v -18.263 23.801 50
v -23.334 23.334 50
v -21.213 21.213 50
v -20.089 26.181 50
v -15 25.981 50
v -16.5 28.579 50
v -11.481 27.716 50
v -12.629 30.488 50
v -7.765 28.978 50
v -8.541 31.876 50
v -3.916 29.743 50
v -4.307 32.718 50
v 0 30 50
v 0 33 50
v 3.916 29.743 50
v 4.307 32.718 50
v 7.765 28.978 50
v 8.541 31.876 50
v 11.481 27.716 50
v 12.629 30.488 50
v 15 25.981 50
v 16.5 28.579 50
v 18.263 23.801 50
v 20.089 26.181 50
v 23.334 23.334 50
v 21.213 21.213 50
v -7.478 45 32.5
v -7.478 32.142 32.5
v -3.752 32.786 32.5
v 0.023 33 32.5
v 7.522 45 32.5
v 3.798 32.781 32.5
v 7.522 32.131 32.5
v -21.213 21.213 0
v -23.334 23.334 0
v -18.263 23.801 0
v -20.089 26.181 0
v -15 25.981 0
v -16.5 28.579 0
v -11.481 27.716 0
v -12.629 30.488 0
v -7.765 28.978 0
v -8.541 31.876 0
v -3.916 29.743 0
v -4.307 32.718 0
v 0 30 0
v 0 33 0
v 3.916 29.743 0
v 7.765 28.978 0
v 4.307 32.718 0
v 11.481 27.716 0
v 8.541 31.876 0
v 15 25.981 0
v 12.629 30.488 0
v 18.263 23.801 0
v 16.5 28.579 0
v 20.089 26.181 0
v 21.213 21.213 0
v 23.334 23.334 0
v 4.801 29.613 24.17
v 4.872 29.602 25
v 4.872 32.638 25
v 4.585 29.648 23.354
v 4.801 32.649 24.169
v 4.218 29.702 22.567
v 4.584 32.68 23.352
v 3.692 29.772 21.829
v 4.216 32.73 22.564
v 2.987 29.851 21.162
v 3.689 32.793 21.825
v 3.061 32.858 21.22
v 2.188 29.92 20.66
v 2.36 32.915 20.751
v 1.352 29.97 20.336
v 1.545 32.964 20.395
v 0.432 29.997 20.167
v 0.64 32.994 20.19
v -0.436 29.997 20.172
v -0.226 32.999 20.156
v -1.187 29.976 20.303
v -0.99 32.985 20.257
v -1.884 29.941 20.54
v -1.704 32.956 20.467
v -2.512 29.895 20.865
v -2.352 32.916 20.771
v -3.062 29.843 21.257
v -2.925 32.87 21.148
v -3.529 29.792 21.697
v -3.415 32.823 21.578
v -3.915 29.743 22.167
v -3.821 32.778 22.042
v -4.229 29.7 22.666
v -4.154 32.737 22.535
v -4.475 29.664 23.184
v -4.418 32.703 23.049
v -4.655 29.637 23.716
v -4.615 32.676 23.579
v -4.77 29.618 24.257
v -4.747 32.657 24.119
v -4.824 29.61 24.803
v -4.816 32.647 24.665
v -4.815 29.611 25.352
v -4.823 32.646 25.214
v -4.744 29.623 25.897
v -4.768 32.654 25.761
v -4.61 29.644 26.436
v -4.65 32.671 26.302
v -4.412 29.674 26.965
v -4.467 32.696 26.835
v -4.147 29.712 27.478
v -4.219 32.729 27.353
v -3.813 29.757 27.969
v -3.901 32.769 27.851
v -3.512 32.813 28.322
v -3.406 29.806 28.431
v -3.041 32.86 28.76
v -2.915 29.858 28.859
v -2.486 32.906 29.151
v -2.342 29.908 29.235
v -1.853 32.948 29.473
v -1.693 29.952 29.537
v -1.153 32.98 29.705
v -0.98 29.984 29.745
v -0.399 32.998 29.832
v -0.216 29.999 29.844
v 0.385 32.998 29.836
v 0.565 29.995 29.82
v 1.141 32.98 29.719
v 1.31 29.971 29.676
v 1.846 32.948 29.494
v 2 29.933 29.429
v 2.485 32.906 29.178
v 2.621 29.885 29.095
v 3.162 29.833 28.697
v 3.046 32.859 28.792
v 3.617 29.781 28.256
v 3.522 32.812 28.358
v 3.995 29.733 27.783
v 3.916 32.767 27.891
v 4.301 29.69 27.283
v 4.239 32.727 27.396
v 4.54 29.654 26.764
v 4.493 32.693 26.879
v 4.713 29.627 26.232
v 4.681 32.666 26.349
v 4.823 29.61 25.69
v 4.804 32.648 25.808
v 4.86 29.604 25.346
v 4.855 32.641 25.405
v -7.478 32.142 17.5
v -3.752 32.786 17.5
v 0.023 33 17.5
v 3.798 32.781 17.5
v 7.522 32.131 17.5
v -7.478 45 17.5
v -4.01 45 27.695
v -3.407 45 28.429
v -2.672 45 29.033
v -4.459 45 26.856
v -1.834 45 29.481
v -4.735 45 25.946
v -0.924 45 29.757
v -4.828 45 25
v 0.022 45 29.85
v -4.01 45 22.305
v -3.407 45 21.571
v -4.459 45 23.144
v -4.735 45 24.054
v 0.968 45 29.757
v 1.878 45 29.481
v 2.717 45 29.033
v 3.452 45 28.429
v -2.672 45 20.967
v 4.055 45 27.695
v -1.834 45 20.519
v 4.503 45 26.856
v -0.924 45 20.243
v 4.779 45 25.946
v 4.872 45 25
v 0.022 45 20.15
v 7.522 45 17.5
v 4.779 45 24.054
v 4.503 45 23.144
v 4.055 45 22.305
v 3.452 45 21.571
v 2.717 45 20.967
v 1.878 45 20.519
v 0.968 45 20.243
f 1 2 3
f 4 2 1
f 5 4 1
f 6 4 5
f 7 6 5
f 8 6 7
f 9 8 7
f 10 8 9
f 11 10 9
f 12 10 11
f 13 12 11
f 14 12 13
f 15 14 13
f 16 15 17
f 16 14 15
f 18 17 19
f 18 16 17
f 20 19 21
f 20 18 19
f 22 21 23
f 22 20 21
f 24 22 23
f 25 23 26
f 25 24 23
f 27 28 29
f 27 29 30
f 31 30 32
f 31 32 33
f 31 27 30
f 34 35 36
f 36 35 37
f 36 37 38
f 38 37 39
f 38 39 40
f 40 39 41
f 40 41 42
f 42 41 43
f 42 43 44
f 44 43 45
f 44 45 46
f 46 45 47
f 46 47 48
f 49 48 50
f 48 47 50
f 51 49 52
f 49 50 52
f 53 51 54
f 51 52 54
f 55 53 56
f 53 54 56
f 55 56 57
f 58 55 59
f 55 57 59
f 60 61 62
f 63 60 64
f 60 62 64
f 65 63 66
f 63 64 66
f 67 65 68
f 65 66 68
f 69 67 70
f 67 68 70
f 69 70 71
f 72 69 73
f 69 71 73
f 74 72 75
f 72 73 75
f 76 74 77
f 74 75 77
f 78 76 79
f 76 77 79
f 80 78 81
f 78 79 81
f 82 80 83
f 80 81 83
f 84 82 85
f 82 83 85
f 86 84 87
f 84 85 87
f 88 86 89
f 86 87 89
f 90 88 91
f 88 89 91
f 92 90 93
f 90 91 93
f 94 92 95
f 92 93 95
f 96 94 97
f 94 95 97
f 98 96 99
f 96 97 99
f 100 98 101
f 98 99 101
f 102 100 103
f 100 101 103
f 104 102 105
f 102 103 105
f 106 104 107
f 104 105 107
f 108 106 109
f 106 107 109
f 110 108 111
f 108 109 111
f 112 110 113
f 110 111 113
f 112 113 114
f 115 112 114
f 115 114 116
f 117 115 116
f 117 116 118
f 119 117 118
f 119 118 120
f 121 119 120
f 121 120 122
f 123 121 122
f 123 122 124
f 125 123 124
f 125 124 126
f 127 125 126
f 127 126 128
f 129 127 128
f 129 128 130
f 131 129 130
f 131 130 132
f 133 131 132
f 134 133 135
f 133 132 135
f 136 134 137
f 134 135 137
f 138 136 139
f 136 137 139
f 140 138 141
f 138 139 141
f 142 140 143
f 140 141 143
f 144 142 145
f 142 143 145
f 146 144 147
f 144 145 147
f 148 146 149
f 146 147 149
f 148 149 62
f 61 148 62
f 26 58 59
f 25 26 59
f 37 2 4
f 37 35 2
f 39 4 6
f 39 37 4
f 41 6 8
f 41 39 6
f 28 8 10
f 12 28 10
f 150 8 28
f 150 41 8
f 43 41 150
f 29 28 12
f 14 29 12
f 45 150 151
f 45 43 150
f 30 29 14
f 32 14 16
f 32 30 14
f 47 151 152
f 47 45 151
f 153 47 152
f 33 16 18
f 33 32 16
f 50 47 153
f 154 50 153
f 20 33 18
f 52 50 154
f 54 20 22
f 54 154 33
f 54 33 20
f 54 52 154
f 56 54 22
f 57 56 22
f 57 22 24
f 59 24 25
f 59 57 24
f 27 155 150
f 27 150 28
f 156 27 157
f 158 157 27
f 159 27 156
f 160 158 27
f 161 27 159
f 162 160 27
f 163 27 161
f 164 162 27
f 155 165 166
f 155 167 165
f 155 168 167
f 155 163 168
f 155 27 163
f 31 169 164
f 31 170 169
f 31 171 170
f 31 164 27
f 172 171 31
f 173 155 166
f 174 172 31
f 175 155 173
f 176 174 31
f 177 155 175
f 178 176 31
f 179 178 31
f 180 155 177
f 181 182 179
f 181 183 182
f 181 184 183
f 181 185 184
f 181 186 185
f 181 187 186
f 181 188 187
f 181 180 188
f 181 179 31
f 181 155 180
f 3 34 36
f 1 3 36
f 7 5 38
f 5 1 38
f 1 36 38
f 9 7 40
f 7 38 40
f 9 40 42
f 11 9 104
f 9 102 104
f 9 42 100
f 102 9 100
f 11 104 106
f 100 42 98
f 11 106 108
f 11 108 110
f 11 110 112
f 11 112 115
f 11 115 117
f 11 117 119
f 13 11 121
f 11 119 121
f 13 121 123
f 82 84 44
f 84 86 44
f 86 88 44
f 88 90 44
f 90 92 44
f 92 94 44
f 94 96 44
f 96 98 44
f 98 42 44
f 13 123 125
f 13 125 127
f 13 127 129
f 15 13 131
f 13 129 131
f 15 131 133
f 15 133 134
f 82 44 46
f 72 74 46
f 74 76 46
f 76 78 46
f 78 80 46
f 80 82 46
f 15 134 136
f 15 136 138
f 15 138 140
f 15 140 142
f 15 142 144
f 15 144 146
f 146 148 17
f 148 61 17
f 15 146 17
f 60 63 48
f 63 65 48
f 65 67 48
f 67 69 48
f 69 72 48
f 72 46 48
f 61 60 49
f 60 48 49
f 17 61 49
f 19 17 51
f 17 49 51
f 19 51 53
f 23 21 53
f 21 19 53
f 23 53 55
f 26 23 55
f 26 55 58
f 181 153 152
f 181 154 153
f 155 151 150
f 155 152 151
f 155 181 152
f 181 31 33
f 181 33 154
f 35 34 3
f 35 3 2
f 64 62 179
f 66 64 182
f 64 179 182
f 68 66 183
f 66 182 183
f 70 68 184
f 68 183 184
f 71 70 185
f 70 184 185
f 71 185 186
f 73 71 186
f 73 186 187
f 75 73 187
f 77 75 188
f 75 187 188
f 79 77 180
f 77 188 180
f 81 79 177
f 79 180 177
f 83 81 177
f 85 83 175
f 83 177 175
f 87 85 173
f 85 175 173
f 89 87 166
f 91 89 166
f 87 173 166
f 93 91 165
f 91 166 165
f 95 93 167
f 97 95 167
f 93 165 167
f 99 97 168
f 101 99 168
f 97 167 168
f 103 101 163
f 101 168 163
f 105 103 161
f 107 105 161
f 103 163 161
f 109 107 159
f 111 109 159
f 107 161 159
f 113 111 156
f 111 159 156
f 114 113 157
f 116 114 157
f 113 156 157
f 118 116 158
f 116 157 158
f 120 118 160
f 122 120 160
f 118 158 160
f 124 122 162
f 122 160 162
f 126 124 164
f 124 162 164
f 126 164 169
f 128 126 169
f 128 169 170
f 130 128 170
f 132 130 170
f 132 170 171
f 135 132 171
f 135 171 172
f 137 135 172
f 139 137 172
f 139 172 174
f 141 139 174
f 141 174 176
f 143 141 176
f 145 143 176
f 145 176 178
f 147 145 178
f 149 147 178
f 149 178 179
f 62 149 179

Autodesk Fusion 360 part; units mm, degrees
sketch "Boceto1" plane through (0, 0, 0) normal (0, 0, 1) x (1, 0, 0)
  line L0 (0, 0) -> (23.3345, 23.3345)
  line L1 (0, 0) -> (33, 0) construction
  line L2 (0, 0) -> (-23.3345, 23.3345)
  arc A0 (33, 0) -> (-23.3345, 23.3345) centre (0, 0) ccw
  arc A1 (21.2132, 21.2132) -> (-21.2132, 21.2132) centre (0, 0) ccw
  dimension "d1" = 60
  dimension "d3" = 45
extrude "Extruir1" add sketch "Boceto1" along normal blind 50 contours L0 L2 A0 A1
ref_plane "PlanoDeObra1" through (0, 45, 0) normal (0, 1, 0) x (0, 0, 1)
sketch "Boceto2" plane through (0, 45, 0) normal (0, 1, 0) x (1, 0, 0)
  circle A0 centre (0.0223, -25) radius 4.85
  line L0 (7.5223, -17.5) -> (-7.4777, -17.5)
  line L1 (-7.4777, -17.5) -> (-7.4777, -32.5)
  line L2 (-7.4777, -32.5) -> (7.5223, -32.5)
  line L3 (7.5223, -32.5) -> (7.5223, -17.5)
  line L4 (7.5223, -17.5) -> (-7.4777, -32.5) construction
  line L5 (-7.4777, -17.5) -> (7.5223, -32.5) construction
  point P0 (0.0223, -25)
  dimension "d7" = 9.7
  dimension "d8" = 25
  dimension "d9" = 15
  dimension "d10" = 15
extrude "Extruir2" add sketch "Boceto2" against normal blind 14
extrude "Extruir3" cut sketch "Boceto2" against normal blind 31 contours A0
